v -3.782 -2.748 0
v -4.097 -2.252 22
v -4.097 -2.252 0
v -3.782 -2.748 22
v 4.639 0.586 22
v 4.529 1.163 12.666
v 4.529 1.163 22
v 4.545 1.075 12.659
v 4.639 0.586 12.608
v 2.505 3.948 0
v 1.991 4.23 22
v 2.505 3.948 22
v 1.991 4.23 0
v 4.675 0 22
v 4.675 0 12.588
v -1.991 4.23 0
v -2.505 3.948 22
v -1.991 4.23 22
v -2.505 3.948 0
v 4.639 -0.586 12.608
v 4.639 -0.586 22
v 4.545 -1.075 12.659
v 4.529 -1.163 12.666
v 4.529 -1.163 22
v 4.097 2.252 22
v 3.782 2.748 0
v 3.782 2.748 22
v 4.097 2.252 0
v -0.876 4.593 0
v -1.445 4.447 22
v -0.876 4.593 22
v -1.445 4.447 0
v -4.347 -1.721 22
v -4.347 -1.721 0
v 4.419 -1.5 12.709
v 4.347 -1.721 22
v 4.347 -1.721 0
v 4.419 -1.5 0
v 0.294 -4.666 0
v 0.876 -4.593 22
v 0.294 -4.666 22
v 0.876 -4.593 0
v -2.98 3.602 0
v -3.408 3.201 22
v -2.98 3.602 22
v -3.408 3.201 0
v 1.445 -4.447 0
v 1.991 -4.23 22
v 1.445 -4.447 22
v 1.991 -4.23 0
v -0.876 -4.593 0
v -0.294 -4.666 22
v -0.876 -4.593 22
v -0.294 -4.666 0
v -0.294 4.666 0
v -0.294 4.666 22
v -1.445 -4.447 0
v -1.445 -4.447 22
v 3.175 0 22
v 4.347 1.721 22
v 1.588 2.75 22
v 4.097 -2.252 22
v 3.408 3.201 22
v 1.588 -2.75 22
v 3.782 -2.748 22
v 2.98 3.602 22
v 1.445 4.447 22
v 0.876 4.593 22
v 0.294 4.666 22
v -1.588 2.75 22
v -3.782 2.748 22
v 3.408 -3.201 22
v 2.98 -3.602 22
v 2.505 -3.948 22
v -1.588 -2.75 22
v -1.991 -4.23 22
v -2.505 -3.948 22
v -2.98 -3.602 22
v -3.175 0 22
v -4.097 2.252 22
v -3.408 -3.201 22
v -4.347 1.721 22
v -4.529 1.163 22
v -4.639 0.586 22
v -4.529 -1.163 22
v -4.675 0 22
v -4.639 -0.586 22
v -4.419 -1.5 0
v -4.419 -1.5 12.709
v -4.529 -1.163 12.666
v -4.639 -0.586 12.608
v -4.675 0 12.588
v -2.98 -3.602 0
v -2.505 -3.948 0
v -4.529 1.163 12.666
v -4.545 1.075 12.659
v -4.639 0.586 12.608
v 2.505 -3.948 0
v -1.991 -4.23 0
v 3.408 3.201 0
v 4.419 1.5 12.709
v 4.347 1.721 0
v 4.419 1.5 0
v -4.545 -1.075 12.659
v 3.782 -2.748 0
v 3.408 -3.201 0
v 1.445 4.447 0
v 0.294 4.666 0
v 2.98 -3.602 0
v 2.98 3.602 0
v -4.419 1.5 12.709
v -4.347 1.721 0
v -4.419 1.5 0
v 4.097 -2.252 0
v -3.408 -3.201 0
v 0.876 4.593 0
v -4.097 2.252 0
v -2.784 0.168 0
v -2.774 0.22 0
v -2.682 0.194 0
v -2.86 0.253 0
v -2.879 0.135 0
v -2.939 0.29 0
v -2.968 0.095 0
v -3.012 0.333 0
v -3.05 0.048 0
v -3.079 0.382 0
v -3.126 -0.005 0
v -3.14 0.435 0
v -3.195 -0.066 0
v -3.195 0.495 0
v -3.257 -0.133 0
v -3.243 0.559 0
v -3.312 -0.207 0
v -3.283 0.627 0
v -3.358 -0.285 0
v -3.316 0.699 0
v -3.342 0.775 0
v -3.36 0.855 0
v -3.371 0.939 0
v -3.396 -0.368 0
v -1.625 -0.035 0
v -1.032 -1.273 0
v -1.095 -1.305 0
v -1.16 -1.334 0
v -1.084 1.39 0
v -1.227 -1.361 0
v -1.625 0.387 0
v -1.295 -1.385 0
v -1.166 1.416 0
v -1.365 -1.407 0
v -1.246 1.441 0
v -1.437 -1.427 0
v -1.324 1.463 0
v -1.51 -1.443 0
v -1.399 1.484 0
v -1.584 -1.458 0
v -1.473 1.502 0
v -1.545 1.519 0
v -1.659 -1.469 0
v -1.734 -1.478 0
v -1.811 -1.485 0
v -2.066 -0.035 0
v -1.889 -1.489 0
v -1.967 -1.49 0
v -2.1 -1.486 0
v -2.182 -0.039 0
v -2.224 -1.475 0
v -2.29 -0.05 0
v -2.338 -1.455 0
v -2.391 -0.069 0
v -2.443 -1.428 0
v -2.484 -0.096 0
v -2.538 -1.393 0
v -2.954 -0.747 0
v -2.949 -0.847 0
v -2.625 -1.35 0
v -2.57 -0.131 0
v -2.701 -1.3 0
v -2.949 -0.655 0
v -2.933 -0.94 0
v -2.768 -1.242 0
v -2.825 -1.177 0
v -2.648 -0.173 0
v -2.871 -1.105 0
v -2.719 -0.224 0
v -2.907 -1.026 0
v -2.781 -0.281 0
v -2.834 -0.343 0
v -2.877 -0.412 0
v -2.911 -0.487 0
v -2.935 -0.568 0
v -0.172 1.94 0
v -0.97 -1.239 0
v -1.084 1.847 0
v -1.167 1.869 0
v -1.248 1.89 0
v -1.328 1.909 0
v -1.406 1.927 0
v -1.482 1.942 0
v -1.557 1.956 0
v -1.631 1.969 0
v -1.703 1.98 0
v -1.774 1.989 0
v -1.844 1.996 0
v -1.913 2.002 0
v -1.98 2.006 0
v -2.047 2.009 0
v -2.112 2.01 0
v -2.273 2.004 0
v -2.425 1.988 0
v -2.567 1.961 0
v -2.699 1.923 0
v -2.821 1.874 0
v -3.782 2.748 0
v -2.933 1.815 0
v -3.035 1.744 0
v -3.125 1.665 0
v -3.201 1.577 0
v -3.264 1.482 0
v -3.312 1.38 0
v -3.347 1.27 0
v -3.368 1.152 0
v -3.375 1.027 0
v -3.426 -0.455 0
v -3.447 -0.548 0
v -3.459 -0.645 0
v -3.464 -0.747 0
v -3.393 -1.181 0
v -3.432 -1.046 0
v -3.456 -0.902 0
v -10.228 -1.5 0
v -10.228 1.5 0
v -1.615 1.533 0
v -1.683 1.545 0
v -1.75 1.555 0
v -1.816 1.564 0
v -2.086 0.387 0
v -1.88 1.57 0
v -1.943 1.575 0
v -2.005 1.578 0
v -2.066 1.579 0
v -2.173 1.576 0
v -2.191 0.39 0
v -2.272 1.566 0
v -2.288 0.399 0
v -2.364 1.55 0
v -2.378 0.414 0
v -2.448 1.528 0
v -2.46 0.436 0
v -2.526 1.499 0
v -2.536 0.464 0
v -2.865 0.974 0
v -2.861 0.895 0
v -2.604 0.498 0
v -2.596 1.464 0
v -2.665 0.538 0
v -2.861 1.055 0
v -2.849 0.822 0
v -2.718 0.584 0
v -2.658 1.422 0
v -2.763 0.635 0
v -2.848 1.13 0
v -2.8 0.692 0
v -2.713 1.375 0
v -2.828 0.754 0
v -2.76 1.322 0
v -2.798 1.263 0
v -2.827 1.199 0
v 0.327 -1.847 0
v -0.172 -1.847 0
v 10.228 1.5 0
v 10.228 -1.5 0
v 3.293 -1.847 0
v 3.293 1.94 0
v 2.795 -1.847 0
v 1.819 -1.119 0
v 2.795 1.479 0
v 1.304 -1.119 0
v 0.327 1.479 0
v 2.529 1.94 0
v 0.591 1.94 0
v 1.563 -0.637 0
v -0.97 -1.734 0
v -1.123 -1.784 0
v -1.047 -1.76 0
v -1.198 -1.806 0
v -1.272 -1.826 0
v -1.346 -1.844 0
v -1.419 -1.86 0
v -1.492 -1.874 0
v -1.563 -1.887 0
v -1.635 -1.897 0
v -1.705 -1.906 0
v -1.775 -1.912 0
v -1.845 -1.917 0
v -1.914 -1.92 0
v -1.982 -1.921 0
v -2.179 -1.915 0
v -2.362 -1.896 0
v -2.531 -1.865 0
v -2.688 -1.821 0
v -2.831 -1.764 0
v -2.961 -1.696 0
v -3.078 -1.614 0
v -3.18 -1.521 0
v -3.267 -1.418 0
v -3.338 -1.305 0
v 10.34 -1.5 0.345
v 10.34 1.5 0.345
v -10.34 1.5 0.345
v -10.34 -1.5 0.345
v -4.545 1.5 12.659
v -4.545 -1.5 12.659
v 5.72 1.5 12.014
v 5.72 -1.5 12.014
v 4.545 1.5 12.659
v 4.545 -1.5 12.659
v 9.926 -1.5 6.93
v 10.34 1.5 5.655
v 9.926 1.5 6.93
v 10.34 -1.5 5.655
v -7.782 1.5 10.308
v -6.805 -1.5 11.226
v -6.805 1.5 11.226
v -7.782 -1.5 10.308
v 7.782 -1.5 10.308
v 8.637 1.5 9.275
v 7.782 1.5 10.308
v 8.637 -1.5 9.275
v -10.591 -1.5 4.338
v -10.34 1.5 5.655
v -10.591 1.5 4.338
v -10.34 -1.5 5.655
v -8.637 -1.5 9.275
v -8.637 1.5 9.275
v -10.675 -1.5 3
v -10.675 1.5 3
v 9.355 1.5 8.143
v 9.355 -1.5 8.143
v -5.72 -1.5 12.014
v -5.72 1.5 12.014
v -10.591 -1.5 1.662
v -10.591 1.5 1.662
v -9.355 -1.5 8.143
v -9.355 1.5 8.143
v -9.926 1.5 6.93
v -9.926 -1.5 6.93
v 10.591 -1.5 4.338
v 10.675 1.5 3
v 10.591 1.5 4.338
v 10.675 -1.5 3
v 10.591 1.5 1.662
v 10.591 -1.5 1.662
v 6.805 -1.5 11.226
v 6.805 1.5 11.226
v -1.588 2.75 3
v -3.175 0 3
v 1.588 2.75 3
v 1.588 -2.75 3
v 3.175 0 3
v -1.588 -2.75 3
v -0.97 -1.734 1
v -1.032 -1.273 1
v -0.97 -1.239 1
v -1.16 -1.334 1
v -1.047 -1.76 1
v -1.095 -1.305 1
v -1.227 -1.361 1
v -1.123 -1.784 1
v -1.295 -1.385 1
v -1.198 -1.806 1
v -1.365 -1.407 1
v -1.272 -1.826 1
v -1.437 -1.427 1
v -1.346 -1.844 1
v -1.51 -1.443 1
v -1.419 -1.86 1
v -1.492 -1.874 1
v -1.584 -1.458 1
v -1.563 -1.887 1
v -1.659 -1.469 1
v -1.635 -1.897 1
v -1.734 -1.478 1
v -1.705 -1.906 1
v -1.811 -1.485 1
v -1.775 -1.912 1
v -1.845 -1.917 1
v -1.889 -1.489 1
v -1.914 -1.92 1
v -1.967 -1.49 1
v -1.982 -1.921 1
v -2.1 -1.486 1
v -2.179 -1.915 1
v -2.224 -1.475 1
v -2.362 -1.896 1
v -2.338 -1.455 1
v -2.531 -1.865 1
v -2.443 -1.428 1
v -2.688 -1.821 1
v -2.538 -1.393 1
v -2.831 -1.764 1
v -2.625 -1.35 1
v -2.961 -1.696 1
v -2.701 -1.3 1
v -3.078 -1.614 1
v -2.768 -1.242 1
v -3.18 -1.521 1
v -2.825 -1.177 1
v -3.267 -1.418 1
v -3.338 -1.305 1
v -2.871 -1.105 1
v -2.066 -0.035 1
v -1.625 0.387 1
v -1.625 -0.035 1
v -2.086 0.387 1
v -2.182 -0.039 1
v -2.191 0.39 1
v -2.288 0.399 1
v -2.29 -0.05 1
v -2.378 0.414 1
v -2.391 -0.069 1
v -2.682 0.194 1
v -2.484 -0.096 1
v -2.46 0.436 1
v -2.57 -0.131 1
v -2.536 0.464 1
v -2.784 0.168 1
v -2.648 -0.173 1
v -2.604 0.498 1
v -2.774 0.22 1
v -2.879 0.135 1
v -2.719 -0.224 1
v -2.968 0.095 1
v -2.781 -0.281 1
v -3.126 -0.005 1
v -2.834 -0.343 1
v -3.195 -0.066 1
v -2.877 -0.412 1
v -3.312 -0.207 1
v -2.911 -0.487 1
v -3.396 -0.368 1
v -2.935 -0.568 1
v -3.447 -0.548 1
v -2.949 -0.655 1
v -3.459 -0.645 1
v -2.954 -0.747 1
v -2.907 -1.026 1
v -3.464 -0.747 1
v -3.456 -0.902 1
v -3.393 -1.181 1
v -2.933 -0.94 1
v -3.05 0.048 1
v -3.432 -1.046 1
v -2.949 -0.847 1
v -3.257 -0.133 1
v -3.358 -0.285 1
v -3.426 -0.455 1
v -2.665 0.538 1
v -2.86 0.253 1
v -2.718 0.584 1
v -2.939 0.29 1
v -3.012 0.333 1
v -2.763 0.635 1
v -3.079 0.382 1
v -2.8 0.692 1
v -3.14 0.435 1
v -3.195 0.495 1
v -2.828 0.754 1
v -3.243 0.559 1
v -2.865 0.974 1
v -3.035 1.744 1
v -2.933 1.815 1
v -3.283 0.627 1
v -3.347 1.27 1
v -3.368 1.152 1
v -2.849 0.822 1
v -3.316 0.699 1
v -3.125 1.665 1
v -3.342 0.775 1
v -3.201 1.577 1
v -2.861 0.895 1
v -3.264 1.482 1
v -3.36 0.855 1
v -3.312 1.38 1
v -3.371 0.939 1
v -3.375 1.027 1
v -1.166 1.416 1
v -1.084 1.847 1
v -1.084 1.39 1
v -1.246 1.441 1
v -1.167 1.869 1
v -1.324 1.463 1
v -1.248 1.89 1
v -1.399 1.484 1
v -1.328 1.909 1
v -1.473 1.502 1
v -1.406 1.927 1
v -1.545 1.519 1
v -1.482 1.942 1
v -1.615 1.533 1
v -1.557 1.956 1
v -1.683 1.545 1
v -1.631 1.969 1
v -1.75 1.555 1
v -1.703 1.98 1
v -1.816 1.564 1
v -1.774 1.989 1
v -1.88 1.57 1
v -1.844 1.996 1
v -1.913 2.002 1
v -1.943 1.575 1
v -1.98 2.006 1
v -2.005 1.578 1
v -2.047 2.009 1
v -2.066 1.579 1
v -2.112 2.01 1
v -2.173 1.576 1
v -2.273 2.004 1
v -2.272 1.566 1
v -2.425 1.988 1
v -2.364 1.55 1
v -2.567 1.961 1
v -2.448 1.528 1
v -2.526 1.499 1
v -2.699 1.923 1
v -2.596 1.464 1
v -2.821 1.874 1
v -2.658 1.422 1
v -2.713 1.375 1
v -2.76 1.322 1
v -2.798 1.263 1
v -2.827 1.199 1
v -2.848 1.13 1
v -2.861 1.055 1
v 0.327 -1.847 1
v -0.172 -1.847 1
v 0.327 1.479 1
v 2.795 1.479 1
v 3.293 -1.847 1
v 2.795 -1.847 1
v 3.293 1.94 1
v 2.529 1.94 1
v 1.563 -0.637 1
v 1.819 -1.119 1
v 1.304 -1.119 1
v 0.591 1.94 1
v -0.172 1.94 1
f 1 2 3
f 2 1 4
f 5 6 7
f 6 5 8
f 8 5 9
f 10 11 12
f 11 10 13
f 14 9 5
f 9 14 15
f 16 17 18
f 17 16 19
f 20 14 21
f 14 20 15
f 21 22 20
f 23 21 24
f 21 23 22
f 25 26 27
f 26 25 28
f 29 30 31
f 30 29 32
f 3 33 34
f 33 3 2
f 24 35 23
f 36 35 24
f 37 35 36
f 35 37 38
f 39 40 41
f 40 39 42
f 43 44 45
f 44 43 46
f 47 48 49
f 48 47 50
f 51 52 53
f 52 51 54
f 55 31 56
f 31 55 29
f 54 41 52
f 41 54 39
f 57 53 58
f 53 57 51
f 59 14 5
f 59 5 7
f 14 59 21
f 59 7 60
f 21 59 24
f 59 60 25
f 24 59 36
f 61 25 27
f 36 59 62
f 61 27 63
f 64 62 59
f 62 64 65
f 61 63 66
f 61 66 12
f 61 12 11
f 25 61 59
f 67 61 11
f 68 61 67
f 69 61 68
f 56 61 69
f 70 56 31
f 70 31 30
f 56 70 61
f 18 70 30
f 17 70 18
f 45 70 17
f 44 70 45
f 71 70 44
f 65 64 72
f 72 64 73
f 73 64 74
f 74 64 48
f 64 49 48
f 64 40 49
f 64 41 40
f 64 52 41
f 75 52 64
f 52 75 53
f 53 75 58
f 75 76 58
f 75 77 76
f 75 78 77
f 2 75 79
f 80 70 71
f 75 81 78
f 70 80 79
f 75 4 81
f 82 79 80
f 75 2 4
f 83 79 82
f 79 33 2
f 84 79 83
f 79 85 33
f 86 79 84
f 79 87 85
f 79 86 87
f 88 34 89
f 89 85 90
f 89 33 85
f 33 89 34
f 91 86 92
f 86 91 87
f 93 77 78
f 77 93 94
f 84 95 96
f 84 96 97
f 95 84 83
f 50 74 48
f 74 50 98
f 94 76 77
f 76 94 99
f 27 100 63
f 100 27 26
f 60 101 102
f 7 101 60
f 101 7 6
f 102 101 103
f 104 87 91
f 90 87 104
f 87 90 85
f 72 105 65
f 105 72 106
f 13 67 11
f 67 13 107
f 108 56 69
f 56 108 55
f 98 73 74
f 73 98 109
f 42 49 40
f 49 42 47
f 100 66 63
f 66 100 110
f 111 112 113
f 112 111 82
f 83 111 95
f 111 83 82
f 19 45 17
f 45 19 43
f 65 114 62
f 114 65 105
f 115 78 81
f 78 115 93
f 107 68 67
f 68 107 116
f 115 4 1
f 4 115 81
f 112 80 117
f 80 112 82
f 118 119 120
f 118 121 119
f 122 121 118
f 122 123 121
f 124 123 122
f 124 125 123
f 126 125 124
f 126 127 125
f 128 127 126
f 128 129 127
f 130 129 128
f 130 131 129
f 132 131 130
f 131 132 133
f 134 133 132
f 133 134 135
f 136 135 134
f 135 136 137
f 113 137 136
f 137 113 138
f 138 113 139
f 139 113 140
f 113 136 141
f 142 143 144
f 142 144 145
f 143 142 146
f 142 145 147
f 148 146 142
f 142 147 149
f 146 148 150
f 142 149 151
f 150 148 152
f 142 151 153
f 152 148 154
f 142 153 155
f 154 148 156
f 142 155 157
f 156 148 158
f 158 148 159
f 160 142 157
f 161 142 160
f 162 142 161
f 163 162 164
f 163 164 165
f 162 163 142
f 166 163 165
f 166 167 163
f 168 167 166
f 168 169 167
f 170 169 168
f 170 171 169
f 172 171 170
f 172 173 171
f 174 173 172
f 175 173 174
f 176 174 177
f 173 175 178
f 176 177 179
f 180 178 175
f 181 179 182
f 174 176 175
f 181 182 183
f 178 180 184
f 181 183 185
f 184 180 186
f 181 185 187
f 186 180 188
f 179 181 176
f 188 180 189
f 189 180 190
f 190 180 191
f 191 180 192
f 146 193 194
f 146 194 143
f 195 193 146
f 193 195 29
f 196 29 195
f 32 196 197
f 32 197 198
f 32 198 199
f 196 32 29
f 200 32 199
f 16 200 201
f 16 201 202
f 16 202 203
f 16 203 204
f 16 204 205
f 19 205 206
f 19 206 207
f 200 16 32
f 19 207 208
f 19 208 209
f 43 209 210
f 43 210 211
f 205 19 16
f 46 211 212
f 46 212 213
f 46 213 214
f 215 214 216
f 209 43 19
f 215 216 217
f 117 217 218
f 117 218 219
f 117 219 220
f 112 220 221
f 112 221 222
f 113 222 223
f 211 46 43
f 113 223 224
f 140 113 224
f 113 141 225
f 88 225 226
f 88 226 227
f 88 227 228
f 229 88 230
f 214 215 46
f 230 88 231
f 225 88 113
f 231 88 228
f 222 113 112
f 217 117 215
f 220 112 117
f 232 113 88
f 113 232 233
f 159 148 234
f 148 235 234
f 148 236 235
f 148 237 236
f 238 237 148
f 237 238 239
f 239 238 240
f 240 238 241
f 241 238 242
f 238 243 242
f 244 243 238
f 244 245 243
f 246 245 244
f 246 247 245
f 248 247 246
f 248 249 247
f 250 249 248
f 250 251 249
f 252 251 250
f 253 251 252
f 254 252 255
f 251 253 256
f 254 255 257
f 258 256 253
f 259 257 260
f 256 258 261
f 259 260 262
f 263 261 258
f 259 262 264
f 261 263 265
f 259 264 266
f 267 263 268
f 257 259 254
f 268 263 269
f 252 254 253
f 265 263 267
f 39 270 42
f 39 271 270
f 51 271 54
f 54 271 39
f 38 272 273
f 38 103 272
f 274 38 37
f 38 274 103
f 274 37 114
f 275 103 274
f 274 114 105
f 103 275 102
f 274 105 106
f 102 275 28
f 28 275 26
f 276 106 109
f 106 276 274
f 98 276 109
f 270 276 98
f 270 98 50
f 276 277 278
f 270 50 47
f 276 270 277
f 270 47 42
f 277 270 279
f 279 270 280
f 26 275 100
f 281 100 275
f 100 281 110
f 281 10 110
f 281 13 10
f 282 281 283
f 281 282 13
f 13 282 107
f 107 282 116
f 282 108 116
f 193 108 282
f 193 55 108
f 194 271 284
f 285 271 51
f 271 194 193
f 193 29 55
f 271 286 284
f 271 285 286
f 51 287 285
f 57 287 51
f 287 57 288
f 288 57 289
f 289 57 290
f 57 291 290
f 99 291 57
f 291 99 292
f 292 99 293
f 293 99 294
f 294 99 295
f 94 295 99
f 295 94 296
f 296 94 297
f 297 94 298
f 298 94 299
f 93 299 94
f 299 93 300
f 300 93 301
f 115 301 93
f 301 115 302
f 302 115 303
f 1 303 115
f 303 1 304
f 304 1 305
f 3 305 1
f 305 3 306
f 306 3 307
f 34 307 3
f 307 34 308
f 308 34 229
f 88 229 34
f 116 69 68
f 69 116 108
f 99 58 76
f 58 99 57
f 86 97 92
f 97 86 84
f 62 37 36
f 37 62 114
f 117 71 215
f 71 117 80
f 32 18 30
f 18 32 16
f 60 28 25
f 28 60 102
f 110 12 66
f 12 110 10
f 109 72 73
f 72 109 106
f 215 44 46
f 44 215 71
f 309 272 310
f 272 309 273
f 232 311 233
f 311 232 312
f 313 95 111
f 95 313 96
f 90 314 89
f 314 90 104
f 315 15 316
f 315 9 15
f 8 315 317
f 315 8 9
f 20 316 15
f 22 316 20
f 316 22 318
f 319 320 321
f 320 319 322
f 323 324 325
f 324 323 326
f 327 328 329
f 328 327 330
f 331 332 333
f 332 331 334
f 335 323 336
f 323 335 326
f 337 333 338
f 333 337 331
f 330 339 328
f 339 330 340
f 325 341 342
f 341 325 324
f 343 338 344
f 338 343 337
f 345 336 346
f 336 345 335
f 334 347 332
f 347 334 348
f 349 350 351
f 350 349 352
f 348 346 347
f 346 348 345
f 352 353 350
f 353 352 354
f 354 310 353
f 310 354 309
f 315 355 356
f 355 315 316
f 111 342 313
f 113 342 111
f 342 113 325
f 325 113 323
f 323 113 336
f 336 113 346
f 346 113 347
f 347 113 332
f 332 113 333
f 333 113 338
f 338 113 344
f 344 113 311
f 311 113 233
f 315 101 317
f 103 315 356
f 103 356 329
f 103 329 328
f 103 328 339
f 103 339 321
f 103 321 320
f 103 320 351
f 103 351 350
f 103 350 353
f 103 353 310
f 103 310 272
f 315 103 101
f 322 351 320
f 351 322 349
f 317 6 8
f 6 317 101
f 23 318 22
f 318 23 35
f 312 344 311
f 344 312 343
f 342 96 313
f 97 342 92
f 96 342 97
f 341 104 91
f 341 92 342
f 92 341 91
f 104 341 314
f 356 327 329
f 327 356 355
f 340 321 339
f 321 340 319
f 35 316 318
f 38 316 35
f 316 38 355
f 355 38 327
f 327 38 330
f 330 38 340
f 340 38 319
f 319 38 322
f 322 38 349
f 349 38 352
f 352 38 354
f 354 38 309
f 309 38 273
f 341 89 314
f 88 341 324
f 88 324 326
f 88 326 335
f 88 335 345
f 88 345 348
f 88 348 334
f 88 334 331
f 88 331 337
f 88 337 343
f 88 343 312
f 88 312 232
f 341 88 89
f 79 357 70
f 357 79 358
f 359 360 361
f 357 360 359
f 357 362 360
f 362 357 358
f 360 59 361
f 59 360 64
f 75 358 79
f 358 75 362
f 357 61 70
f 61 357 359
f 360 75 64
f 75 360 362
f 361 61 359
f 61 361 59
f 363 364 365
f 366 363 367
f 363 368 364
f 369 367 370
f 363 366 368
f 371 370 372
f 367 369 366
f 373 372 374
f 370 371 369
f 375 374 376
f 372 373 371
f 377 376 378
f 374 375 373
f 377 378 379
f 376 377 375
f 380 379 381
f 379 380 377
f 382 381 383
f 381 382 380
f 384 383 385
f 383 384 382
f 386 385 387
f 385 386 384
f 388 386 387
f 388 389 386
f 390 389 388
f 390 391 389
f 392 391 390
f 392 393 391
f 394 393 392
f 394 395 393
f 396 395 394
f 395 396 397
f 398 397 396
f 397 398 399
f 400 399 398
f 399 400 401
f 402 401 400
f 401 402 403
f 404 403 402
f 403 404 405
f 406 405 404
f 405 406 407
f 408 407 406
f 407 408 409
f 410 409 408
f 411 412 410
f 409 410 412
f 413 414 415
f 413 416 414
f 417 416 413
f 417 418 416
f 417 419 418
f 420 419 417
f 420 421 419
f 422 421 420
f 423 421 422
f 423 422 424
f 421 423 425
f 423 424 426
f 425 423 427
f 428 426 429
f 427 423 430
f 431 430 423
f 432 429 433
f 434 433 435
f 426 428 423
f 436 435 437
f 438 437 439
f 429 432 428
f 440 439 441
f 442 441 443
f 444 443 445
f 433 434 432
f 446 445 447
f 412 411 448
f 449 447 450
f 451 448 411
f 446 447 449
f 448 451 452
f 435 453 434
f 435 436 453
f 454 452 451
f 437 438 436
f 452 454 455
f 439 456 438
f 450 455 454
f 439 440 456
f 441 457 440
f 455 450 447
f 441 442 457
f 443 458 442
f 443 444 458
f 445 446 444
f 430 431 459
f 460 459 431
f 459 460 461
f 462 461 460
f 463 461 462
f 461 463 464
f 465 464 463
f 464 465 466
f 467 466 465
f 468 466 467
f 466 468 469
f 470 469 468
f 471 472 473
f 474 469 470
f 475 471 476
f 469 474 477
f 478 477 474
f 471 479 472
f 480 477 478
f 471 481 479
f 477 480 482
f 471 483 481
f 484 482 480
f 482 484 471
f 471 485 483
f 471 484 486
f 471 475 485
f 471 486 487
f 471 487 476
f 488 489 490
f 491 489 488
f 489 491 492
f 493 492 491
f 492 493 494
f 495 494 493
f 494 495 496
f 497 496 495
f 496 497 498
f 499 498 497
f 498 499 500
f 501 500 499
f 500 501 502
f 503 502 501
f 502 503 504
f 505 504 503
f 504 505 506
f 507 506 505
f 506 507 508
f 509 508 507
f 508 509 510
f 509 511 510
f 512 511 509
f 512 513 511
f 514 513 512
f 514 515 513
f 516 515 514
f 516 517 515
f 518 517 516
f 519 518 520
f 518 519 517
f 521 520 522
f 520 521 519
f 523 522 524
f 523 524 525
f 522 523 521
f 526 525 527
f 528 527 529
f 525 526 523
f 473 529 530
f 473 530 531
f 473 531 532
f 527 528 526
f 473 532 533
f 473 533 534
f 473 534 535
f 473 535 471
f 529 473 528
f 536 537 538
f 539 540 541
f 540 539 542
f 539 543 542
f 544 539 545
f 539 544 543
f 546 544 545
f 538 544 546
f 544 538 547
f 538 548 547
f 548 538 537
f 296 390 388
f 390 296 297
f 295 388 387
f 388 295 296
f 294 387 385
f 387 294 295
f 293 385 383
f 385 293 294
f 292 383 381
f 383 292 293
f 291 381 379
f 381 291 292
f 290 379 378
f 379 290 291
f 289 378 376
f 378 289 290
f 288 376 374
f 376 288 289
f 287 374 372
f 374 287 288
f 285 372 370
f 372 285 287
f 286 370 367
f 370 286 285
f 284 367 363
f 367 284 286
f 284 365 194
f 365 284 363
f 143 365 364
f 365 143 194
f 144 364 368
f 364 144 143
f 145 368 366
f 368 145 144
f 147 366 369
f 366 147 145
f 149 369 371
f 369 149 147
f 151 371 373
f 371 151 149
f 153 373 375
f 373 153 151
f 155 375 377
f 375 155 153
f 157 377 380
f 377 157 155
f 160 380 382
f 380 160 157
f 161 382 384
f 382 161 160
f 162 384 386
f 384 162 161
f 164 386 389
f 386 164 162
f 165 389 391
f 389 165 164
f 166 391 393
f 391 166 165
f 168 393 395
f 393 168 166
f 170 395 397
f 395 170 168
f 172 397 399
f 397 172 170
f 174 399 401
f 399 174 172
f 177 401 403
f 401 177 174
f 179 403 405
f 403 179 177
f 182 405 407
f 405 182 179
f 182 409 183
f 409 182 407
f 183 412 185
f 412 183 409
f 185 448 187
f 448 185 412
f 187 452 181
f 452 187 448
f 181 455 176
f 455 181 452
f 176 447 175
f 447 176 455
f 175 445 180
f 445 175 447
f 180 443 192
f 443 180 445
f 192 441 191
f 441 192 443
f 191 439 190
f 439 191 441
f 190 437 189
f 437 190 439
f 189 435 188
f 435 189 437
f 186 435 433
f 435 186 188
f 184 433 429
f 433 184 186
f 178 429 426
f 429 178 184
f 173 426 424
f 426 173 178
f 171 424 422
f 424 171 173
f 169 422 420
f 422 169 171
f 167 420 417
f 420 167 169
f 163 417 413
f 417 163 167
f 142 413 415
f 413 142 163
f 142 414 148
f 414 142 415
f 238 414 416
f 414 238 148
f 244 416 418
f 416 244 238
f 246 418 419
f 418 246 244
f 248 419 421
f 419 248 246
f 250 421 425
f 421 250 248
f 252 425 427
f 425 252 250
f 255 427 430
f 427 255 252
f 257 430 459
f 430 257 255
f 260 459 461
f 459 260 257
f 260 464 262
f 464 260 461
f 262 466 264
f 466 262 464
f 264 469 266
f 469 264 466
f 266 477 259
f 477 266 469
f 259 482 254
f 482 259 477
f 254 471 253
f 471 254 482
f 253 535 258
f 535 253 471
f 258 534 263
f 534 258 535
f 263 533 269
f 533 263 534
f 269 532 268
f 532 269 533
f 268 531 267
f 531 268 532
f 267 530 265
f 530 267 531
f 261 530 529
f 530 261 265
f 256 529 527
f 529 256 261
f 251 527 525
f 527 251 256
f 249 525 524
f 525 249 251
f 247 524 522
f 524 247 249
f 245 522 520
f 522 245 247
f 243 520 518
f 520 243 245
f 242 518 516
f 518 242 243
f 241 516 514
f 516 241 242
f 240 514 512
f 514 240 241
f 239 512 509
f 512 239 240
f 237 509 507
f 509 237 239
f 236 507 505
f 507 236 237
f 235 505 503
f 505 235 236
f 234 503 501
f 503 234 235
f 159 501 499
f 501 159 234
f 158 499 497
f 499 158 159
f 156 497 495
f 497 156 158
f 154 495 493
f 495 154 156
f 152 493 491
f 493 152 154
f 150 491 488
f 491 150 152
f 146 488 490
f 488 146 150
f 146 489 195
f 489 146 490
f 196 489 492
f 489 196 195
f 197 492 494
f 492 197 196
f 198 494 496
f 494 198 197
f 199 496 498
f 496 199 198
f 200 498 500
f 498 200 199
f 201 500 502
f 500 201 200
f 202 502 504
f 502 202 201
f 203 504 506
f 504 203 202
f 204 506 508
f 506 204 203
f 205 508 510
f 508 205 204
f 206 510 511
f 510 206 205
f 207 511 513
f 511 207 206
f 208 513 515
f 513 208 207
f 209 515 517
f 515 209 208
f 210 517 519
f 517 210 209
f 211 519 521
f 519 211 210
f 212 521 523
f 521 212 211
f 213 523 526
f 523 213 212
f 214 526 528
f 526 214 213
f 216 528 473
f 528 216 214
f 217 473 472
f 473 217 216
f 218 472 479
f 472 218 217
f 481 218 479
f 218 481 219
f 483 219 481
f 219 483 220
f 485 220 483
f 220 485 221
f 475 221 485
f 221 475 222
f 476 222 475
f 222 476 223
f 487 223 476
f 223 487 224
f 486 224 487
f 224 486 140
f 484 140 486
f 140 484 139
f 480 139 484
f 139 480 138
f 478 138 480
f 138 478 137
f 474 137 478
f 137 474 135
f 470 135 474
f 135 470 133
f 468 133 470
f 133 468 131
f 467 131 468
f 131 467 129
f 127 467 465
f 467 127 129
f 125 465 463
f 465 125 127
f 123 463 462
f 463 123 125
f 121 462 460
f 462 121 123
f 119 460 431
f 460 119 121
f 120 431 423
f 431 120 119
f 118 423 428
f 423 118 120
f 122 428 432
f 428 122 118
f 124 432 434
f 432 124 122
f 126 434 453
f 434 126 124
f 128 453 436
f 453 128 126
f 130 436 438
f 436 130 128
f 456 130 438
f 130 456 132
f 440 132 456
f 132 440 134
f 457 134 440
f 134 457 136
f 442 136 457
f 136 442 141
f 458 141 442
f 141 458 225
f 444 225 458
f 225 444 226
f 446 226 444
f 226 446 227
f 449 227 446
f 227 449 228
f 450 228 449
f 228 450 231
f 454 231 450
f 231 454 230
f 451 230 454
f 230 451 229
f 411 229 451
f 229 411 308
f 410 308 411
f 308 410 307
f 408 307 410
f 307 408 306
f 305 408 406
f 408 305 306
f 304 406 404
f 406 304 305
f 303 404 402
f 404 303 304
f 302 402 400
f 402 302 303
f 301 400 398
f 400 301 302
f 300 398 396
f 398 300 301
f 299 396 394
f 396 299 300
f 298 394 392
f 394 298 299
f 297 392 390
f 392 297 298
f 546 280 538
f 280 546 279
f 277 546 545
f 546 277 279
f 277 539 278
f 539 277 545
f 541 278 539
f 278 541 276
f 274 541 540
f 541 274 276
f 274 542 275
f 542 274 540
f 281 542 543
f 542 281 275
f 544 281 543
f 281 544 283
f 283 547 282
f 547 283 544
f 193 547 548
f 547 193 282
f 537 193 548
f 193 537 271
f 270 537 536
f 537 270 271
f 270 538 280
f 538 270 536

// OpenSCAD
$fn = 50;
label="M3";
nut_short_diameter=5.5;
nut_diameter=2 * (nut_short_diameter / sqrt(3));
outer_diameter=nut_diameter + 3;
height = 22;
fin_width = outer_diameter + 12;
fin_thickness = 3;
fin_offset = 3;



difference() {
    union() {
        linear_extrude(height) {
            circle(d=outer_diameter);
        }
        rotate([90, 0, 0]){
            translate([0, fin_offset, -fin_thickness / 2]){
                linear_extrude(fin_thickness) {
                    difference() {
                        circle(d=fin_width);
                        translate([0, -fin_width / 2 - fin_offset, 0]){
                            square([fin_width, fin_width], true);
                        }
                    }
                }
            }
        }
    }
    translate([0, 0, 3]) {
        linear_extrude(height * 100) {
            circle(d=nut_diameter, $fn=6);
        }
    }
    translate([0, 0, -1]){
        linear_extrude(2) {
            rotate([0, 180, 0]){
            text(label, size=outer_diameter * 0.4, font="Nunito Extra Bold", halign="center", valign="center");
            }
        }
    }
}
